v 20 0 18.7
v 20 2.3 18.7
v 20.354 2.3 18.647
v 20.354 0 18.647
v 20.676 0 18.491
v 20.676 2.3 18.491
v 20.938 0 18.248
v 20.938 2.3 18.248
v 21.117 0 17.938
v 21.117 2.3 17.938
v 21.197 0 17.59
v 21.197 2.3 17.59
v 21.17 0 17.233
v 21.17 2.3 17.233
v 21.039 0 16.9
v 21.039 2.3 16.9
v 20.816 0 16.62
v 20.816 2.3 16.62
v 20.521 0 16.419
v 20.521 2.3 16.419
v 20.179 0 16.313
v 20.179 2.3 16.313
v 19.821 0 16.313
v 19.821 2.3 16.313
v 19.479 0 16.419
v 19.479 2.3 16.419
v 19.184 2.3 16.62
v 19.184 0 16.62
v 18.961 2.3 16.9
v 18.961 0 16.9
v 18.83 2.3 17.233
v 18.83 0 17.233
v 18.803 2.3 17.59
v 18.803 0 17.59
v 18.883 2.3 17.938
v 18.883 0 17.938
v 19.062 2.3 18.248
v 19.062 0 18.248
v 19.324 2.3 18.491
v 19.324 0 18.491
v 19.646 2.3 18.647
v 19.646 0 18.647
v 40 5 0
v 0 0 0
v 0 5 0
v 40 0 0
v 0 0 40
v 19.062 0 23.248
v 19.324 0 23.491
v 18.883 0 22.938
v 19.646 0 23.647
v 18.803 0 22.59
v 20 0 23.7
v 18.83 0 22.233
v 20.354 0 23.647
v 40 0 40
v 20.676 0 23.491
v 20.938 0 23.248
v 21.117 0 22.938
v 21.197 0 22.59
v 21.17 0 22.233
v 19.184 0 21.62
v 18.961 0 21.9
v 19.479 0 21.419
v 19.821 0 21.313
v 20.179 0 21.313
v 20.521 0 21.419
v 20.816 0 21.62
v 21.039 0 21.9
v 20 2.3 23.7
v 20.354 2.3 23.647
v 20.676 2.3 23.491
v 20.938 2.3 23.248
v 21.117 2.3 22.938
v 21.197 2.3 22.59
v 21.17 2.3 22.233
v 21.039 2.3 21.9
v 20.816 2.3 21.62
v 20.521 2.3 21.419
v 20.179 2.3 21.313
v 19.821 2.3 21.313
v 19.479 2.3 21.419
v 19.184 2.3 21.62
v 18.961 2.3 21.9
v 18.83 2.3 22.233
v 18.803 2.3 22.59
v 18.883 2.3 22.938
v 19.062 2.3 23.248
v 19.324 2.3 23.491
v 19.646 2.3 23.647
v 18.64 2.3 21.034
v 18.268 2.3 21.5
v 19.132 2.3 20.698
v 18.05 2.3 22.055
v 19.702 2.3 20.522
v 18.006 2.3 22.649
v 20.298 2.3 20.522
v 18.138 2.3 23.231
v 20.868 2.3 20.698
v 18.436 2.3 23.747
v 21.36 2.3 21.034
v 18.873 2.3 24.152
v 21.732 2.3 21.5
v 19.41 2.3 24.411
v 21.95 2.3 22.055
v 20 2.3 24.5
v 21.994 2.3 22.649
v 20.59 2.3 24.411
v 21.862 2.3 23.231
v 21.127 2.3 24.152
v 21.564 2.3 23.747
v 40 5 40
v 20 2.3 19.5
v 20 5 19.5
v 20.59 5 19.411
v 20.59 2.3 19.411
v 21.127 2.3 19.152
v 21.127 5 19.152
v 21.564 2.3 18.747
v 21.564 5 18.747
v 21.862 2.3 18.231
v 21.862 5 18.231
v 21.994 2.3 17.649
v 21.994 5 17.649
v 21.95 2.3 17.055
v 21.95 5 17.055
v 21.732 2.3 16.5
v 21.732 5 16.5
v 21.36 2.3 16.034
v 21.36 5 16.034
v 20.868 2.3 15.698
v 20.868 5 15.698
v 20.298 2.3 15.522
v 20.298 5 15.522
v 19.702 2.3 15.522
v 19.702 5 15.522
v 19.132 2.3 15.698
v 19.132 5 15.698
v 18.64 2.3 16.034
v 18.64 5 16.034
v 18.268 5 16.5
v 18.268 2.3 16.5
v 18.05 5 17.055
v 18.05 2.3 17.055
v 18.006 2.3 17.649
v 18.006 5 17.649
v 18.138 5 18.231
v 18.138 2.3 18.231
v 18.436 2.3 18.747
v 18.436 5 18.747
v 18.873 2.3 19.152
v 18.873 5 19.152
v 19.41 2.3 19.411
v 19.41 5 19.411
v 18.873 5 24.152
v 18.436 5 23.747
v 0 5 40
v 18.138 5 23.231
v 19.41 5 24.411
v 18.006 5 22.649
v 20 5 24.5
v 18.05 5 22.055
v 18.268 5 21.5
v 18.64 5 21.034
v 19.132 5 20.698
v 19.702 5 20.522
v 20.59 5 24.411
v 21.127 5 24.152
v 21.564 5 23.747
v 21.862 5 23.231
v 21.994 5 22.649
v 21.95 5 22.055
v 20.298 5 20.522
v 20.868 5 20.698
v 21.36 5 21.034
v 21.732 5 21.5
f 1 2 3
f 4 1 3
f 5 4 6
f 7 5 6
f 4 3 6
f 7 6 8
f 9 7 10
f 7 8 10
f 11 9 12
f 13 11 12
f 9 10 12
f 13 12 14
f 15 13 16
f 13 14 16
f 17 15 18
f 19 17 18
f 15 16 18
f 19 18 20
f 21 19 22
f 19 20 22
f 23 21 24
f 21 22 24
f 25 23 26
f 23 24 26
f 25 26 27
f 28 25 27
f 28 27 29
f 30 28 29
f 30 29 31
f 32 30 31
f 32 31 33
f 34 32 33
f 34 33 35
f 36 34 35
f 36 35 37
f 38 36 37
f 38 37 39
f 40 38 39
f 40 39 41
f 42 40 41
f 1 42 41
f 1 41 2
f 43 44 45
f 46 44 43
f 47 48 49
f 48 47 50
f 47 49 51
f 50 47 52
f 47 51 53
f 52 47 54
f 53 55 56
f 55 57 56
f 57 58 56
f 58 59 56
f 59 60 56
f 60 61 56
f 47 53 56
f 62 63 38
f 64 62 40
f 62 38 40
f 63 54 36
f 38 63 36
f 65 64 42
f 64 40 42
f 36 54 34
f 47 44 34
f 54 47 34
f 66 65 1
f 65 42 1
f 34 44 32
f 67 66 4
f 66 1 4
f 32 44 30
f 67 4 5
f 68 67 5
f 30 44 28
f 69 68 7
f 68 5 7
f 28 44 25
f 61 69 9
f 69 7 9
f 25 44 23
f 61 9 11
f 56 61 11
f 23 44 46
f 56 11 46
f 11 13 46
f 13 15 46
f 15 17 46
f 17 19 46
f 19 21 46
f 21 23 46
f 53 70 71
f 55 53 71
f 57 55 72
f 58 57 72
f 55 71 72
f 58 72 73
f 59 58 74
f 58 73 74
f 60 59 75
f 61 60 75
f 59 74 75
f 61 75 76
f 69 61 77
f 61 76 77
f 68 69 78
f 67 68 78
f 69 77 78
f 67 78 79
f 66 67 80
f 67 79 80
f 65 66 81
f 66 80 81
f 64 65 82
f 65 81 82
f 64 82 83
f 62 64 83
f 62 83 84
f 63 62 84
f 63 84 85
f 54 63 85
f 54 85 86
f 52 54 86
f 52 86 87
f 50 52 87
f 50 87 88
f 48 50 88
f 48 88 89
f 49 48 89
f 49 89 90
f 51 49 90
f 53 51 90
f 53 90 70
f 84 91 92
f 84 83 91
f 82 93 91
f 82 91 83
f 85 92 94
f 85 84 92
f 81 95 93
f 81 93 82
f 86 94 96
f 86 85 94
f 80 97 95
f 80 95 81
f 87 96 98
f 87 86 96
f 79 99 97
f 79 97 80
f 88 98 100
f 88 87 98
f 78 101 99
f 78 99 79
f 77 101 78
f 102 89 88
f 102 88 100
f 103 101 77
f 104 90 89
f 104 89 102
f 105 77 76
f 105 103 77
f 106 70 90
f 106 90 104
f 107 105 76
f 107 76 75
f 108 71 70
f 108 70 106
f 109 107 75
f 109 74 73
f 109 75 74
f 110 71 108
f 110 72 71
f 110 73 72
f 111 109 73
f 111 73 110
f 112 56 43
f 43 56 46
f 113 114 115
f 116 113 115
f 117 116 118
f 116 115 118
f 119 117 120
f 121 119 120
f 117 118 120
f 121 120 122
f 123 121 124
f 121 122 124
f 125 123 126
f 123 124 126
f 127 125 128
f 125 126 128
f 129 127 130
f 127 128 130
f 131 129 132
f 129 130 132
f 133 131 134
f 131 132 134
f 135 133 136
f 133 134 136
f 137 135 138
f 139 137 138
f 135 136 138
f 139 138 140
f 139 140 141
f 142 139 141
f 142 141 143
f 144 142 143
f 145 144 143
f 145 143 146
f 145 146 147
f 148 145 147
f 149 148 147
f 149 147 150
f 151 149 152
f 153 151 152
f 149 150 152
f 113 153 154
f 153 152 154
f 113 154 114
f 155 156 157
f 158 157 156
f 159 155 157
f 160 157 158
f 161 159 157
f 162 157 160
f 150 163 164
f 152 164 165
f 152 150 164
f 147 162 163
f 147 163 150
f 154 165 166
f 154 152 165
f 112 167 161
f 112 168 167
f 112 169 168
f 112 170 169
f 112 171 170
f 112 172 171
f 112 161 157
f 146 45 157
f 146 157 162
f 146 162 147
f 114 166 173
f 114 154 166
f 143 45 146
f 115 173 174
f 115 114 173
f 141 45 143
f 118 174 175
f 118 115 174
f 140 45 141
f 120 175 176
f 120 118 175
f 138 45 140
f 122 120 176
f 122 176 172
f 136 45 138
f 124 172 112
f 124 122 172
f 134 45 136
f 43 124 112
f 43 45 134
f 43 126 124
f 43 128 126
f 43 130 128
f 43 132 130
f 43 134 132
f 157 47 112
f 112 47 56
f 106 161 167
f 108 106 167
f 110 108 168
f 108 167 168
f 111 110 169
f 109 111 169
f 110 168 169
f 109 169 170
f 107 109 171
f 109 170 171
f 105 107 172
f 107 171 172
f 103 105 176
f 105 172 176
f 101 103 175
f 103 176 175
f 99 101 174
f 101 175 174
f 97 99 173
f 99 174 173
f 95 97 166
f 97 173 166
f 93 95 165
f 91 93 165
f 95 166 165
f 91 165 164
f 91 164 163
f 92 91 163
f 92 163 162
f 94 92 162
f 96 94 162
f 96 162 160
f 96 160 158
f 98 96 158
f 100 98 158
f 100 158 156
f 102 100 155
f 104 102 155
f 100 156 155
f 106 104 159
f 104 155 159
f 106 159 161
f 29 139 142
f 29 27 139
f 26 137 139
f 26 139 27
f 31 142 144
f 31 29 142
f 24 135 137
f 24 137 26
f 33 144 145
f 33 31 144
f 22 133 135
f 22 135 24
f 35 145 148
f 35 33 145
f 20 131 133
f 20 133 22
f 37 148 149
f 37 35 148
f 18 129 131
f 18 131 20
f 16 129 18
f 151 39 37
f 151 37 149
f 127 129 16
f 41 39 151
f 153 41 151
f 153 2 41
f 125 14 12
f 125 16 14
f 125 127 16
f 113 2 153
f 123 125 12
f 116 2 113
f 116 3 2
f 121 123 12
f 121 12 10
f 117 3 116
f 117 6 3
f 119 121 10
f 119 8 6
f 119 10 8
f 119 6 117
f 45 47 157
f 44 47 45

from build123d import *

# Parameters (mm, degrees)
SKETCH_1_W          = 40
SKETCH_1_H          = 40
EXTRUDE_1_DEPTH     = 5
SKETCH_2_R          = 1.2
CUT_EXTRUDE_1_DEPTH = 57.789083458
SKETCH_3_R          = 2
CUT_EXTRUDE_2_DEPTH = 2.7


with BuildPart() as part:
    # 草图1 → 凸台-拉伸1 (new body)
    with BuildSketch(Plane(origin=(0, 0, 0), x_dir=(1, 0, 0), z_dir=(0, 1, 0))):
        with Locations((20, -20)):
            Rectangle(SKETCH_1_W, SKETCH_1_H)
    extrude(amount=EXTRUDE_1_DEPTH)

    # 草图2 → 切除-拉伸1 (cut, through all)
    with BuildSketch(Plane(origin=(0, 5, 0), x_dir=(1, 0, 0), z_dir=(0, 1, 0))):
        with Locations(Location((20, -17.5, 0), (0, 0, 270))):
            Circle(SKETCH_2_R)
        with Locations(Location((20, -22.5, 0), (0, 0, 270))):
            Circle(SKETCH_2_R)
    extrude(amount=-CUT_EXTRUDE_1_DEPTH, mode=Mode.SUBTRACT)

    # 草图3 → 切除-拉伸2 (cut)
    with BuildSketch(Plane(origin=(0, 5, 0), x_dir=(1, 0, 0), z_dir=(0, 1, 0))):
        with Locations(Location((20, -17.5, 0), (0, 0, 270))):
            Circle(SKETCH_3_R)
        with Locations(Location((20, -22.5, 0), (0, 0, 270))):
            Circle(SKETCH_3_R)
    extrude(amount=-CUT_EXTRUDE_2_DEPTH, mode=Mode.SUBTRACT)


solid = part.part
